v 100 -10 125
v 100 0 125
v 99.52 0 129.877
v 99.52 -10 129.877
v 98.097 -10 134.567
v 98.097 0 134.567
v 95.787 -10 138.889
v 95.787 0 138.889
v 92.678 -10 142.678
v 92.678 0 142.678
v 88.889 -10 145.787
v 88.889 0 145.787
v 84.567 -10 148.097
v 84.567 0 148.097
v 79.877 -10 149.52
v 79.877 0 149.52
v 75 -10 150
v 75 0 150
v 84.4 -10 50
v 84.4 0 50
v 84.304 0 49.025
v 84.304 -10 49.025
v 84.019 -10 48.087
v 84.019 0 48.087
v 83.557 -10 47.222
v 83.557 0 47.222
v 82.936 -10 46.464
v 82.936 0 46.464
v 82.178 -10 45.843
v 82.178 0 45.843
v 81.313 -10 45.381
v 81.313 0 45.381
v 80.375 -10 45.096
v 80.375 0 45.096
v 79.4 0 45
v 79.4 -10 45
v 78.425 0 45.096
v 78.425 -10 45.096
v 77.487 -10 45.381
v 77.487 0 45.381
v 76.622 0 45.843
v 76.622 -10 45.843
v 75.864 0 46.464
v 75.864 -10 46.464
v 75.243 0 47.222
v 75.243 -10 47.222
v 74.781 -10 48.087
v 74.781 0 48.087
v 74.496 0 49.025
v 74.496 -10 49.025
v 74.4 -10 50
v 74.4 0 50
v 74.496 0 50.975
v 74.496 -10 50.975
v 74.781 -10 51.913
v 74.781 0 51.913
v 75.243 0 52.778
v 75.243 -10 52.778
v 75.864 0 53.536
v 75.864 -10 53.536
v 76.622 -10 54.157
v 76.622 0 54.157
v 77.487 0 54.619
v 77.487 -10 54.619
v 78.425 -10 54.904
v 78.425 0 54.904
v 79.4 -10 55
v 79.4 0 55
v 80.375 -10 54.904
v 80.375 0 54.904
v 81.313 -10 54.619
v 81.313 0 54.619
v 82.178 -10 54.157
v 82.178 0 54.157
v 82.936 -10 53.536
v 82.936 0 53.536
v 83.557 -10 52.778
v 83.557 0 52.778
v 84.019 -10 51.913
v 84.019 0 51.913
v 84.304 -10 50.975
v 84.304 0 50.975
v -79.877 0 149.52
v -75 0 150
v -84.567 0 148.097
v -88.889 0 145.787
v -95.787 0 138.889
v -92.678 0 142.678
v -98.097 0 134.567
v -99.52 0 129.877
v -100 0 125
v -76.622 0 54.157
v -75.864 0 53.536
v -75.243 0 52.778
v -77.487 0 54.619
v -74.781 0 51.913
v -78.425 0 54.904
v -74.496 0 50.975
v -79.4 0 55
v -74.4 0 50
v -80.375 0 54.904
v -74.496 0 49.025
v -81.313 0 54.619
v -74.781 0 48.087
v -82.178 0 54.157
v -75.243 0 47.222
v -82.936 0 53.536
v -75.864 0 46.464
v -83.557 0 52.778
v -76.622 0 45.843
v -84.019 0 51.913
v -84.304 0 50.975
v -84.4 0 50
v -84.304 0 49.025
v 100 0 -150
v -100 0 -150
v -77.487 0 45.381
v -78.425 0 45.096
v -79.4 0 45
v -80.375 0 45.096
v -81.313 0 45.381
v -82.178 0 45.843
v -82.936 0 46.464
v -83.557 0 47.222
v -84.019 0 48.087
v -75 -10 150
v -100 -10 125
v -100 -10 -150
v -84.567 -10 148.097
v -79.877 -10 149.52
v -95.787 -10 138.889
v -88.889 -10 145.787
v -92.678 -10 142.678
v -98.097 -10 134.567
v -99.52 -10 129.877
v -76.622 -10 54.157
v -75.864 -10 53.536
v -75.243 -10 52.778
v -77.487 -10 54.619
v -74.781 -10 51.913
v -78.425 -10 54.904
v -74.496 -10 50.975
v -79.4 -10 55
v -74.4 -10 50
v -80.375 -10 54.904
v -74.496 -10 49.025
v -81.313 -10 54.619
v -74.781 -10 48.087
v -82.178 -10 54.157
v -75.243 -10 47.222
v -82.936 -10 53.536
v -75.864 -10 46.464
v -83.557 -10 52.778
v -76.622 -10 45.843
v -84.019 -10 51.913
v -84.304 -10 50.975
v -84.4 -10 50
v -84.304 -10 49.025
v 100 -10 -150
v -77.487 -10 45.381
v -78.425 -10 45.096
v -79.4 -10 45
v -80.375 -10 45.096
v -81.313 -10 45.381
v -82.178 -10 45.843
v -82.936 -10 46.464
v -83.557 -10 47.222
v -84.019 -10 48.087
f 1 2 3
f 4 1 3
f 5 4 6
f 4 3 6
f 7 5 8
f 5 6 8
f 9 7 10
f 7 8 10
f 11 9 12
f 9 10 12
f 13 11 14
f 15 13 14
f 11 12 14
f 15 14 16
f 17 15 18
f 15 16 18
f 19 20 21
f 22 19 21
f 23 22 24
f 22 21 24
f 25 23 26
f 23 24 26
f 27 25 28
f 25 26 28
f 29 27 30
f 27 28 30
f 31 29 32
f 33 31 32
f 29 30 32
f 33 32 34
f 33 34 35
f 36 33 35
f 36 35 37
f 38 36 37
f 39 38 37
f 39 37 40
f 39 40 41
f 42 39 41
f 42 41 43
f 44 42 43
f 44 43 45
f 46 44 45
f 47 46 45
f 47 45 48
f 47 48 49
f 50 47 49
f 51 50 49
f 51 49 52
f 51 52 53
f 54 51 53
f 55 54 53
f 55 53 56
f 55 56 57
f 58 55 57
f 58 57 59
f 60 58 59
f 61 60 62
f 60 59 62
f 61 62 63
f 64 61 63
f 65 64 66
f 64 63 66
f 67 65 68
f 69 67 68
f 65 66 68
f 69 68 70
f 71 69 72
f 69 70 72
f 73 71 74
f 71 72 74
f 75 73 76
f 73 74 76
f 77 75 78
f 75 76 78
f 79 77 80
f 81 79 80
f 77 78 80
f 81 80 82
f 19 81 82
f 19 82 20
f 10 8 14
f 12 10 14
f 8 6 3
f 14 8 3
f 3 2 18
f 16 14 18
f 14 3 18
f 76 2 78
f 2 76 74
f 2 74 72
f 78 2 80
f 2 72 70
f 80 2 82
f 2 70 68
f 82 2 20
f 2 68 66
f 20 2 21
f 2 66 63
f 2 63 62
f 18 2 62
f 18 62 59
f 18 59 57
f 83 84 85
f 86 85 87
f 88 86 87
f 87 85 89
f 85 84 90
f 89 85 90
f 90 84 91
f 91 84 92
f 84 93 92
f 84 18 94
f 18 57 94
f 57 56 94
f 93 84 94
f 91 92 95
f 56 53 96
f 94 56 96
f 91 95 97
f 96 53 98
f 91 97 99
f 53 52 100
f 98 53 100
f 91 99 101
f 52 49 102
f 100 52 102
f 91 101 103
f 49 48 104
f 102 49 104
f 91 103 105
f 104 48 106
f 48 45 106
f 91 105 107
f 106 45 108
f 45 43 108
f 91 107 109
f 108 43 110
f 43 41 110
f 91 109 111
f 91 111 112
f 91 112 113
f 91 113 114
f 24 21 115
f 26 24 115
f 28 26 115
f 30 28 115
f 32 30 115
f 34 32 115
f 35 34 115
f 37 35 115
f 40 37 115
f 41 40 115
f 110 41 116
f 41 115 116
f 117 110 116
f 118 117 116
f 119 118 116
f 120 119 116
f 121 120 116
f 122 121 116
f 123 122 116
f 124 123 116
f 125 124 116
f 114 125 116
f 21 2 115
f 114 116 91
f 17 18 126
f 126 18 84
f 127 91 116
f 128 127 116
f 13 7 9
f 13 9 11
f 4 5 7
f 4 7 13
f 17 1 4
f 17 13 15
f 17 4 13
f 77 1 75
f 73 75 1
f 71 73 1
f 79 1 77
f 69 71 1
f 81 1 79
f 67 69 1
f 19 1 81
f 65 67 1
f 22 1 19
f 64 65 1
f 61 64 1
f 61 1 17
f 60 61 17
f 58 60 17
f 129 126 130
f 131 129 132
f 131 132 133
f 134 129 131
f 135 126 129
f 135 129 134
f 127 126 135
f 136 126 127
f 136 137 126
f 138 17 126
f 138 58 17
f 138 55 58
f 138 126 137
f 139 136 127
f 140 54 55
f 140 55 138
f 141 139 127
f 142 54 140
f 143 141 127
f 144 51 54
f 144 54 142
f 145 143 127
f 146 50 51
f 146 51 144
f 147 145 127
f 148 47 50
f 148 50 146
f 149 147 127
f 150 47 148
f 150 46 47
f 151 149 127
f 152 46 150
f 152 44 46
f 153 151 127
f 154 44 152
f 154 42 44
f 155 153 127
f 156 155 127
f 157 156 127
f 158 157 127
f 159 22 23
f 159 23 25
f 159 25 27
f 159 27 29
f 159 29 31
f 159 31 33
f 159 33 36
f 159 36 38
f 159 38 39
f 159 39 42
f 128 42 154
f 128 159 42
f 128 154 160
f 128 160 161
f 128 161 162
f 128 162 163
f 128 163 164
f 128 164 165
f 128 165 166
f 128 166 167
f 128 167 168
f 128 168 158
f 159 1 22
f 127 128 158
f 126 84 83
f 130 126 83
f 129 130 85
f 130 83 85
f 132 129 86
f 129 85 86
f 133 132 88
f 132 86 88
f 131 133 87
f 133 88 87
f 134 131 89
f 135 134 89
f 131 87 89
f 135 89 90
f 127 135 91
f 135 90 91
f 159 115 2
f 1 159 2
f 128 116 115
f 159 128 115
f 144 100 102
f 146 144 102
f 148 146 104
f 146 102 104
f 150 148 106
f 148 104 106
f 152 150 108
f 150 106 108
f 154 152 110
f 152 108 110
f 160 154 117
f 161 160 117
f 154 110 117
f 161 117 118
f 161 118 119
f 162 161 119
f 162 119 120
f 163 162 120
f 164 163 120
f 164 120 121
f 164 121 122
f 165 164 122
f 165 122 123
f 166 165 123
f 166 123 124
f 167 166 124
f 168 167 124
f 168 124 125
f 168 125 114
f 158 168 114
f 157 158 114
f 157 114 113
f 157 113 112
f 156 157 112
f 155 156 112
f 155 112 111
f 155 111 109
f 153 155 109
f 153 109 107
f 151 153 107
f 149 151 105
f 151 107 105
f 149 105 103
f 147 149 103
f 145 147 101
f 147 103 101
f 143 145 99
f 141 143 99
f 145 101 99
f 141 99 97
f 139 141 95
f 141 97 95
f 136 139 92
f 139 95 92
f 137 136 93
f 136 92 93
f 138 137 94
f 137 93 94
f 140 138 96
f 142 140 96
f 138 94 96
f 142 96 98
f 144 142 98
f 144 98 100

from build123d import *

# Parameters (mm, degrees)
BOSS_EXTRUDE1_DEPTH = 10
SKETCH2_R           = 5
CUT_EXTRUDE1_DEPTH  = 11


with BuildPart() as part:
    # Sketch1 → Boss-Extrude1 (new body)
    with BuildSketch(Plane(origin=(0, 0, 0), x_dir=(1, 0, 0), z_dir=(0, 1, 0))):
        with BuildLine():
            Line((-100, 150), (100, 150))
            Line((100, 150), (100, -125))
            ThreePointArc((100, -125), (92.67766953, -142.67766953), (75, -150))
            Line((75, -150), (-75, -150))
            ThreePointArc((-75, -150), (-92.67766953, -142.67766953), (-100, -125))
            Line((-100, -125), (-100, 150))
        make_face()
    extrude(amount=-BOSS_EXTRUDE1_DEPTH)

    # Sketch2 → Cut-Extrude1 (cut, through all)
    with BuildSketch(Plane(origin=(0, 0, 0), x_dir=(1, 0, 0), z_dir=(0, 1, 0))):
        with Locations((-79.4, -50)):
            Circle(SKETCH2_R)
        with Locations((79.4, -50)):
            Circle(SKETCH2_R)
    extrude(amount=-CUT_EXTRUDE1_DEPTH, mode=Mode.SUBTRACT)


solid = part.part
